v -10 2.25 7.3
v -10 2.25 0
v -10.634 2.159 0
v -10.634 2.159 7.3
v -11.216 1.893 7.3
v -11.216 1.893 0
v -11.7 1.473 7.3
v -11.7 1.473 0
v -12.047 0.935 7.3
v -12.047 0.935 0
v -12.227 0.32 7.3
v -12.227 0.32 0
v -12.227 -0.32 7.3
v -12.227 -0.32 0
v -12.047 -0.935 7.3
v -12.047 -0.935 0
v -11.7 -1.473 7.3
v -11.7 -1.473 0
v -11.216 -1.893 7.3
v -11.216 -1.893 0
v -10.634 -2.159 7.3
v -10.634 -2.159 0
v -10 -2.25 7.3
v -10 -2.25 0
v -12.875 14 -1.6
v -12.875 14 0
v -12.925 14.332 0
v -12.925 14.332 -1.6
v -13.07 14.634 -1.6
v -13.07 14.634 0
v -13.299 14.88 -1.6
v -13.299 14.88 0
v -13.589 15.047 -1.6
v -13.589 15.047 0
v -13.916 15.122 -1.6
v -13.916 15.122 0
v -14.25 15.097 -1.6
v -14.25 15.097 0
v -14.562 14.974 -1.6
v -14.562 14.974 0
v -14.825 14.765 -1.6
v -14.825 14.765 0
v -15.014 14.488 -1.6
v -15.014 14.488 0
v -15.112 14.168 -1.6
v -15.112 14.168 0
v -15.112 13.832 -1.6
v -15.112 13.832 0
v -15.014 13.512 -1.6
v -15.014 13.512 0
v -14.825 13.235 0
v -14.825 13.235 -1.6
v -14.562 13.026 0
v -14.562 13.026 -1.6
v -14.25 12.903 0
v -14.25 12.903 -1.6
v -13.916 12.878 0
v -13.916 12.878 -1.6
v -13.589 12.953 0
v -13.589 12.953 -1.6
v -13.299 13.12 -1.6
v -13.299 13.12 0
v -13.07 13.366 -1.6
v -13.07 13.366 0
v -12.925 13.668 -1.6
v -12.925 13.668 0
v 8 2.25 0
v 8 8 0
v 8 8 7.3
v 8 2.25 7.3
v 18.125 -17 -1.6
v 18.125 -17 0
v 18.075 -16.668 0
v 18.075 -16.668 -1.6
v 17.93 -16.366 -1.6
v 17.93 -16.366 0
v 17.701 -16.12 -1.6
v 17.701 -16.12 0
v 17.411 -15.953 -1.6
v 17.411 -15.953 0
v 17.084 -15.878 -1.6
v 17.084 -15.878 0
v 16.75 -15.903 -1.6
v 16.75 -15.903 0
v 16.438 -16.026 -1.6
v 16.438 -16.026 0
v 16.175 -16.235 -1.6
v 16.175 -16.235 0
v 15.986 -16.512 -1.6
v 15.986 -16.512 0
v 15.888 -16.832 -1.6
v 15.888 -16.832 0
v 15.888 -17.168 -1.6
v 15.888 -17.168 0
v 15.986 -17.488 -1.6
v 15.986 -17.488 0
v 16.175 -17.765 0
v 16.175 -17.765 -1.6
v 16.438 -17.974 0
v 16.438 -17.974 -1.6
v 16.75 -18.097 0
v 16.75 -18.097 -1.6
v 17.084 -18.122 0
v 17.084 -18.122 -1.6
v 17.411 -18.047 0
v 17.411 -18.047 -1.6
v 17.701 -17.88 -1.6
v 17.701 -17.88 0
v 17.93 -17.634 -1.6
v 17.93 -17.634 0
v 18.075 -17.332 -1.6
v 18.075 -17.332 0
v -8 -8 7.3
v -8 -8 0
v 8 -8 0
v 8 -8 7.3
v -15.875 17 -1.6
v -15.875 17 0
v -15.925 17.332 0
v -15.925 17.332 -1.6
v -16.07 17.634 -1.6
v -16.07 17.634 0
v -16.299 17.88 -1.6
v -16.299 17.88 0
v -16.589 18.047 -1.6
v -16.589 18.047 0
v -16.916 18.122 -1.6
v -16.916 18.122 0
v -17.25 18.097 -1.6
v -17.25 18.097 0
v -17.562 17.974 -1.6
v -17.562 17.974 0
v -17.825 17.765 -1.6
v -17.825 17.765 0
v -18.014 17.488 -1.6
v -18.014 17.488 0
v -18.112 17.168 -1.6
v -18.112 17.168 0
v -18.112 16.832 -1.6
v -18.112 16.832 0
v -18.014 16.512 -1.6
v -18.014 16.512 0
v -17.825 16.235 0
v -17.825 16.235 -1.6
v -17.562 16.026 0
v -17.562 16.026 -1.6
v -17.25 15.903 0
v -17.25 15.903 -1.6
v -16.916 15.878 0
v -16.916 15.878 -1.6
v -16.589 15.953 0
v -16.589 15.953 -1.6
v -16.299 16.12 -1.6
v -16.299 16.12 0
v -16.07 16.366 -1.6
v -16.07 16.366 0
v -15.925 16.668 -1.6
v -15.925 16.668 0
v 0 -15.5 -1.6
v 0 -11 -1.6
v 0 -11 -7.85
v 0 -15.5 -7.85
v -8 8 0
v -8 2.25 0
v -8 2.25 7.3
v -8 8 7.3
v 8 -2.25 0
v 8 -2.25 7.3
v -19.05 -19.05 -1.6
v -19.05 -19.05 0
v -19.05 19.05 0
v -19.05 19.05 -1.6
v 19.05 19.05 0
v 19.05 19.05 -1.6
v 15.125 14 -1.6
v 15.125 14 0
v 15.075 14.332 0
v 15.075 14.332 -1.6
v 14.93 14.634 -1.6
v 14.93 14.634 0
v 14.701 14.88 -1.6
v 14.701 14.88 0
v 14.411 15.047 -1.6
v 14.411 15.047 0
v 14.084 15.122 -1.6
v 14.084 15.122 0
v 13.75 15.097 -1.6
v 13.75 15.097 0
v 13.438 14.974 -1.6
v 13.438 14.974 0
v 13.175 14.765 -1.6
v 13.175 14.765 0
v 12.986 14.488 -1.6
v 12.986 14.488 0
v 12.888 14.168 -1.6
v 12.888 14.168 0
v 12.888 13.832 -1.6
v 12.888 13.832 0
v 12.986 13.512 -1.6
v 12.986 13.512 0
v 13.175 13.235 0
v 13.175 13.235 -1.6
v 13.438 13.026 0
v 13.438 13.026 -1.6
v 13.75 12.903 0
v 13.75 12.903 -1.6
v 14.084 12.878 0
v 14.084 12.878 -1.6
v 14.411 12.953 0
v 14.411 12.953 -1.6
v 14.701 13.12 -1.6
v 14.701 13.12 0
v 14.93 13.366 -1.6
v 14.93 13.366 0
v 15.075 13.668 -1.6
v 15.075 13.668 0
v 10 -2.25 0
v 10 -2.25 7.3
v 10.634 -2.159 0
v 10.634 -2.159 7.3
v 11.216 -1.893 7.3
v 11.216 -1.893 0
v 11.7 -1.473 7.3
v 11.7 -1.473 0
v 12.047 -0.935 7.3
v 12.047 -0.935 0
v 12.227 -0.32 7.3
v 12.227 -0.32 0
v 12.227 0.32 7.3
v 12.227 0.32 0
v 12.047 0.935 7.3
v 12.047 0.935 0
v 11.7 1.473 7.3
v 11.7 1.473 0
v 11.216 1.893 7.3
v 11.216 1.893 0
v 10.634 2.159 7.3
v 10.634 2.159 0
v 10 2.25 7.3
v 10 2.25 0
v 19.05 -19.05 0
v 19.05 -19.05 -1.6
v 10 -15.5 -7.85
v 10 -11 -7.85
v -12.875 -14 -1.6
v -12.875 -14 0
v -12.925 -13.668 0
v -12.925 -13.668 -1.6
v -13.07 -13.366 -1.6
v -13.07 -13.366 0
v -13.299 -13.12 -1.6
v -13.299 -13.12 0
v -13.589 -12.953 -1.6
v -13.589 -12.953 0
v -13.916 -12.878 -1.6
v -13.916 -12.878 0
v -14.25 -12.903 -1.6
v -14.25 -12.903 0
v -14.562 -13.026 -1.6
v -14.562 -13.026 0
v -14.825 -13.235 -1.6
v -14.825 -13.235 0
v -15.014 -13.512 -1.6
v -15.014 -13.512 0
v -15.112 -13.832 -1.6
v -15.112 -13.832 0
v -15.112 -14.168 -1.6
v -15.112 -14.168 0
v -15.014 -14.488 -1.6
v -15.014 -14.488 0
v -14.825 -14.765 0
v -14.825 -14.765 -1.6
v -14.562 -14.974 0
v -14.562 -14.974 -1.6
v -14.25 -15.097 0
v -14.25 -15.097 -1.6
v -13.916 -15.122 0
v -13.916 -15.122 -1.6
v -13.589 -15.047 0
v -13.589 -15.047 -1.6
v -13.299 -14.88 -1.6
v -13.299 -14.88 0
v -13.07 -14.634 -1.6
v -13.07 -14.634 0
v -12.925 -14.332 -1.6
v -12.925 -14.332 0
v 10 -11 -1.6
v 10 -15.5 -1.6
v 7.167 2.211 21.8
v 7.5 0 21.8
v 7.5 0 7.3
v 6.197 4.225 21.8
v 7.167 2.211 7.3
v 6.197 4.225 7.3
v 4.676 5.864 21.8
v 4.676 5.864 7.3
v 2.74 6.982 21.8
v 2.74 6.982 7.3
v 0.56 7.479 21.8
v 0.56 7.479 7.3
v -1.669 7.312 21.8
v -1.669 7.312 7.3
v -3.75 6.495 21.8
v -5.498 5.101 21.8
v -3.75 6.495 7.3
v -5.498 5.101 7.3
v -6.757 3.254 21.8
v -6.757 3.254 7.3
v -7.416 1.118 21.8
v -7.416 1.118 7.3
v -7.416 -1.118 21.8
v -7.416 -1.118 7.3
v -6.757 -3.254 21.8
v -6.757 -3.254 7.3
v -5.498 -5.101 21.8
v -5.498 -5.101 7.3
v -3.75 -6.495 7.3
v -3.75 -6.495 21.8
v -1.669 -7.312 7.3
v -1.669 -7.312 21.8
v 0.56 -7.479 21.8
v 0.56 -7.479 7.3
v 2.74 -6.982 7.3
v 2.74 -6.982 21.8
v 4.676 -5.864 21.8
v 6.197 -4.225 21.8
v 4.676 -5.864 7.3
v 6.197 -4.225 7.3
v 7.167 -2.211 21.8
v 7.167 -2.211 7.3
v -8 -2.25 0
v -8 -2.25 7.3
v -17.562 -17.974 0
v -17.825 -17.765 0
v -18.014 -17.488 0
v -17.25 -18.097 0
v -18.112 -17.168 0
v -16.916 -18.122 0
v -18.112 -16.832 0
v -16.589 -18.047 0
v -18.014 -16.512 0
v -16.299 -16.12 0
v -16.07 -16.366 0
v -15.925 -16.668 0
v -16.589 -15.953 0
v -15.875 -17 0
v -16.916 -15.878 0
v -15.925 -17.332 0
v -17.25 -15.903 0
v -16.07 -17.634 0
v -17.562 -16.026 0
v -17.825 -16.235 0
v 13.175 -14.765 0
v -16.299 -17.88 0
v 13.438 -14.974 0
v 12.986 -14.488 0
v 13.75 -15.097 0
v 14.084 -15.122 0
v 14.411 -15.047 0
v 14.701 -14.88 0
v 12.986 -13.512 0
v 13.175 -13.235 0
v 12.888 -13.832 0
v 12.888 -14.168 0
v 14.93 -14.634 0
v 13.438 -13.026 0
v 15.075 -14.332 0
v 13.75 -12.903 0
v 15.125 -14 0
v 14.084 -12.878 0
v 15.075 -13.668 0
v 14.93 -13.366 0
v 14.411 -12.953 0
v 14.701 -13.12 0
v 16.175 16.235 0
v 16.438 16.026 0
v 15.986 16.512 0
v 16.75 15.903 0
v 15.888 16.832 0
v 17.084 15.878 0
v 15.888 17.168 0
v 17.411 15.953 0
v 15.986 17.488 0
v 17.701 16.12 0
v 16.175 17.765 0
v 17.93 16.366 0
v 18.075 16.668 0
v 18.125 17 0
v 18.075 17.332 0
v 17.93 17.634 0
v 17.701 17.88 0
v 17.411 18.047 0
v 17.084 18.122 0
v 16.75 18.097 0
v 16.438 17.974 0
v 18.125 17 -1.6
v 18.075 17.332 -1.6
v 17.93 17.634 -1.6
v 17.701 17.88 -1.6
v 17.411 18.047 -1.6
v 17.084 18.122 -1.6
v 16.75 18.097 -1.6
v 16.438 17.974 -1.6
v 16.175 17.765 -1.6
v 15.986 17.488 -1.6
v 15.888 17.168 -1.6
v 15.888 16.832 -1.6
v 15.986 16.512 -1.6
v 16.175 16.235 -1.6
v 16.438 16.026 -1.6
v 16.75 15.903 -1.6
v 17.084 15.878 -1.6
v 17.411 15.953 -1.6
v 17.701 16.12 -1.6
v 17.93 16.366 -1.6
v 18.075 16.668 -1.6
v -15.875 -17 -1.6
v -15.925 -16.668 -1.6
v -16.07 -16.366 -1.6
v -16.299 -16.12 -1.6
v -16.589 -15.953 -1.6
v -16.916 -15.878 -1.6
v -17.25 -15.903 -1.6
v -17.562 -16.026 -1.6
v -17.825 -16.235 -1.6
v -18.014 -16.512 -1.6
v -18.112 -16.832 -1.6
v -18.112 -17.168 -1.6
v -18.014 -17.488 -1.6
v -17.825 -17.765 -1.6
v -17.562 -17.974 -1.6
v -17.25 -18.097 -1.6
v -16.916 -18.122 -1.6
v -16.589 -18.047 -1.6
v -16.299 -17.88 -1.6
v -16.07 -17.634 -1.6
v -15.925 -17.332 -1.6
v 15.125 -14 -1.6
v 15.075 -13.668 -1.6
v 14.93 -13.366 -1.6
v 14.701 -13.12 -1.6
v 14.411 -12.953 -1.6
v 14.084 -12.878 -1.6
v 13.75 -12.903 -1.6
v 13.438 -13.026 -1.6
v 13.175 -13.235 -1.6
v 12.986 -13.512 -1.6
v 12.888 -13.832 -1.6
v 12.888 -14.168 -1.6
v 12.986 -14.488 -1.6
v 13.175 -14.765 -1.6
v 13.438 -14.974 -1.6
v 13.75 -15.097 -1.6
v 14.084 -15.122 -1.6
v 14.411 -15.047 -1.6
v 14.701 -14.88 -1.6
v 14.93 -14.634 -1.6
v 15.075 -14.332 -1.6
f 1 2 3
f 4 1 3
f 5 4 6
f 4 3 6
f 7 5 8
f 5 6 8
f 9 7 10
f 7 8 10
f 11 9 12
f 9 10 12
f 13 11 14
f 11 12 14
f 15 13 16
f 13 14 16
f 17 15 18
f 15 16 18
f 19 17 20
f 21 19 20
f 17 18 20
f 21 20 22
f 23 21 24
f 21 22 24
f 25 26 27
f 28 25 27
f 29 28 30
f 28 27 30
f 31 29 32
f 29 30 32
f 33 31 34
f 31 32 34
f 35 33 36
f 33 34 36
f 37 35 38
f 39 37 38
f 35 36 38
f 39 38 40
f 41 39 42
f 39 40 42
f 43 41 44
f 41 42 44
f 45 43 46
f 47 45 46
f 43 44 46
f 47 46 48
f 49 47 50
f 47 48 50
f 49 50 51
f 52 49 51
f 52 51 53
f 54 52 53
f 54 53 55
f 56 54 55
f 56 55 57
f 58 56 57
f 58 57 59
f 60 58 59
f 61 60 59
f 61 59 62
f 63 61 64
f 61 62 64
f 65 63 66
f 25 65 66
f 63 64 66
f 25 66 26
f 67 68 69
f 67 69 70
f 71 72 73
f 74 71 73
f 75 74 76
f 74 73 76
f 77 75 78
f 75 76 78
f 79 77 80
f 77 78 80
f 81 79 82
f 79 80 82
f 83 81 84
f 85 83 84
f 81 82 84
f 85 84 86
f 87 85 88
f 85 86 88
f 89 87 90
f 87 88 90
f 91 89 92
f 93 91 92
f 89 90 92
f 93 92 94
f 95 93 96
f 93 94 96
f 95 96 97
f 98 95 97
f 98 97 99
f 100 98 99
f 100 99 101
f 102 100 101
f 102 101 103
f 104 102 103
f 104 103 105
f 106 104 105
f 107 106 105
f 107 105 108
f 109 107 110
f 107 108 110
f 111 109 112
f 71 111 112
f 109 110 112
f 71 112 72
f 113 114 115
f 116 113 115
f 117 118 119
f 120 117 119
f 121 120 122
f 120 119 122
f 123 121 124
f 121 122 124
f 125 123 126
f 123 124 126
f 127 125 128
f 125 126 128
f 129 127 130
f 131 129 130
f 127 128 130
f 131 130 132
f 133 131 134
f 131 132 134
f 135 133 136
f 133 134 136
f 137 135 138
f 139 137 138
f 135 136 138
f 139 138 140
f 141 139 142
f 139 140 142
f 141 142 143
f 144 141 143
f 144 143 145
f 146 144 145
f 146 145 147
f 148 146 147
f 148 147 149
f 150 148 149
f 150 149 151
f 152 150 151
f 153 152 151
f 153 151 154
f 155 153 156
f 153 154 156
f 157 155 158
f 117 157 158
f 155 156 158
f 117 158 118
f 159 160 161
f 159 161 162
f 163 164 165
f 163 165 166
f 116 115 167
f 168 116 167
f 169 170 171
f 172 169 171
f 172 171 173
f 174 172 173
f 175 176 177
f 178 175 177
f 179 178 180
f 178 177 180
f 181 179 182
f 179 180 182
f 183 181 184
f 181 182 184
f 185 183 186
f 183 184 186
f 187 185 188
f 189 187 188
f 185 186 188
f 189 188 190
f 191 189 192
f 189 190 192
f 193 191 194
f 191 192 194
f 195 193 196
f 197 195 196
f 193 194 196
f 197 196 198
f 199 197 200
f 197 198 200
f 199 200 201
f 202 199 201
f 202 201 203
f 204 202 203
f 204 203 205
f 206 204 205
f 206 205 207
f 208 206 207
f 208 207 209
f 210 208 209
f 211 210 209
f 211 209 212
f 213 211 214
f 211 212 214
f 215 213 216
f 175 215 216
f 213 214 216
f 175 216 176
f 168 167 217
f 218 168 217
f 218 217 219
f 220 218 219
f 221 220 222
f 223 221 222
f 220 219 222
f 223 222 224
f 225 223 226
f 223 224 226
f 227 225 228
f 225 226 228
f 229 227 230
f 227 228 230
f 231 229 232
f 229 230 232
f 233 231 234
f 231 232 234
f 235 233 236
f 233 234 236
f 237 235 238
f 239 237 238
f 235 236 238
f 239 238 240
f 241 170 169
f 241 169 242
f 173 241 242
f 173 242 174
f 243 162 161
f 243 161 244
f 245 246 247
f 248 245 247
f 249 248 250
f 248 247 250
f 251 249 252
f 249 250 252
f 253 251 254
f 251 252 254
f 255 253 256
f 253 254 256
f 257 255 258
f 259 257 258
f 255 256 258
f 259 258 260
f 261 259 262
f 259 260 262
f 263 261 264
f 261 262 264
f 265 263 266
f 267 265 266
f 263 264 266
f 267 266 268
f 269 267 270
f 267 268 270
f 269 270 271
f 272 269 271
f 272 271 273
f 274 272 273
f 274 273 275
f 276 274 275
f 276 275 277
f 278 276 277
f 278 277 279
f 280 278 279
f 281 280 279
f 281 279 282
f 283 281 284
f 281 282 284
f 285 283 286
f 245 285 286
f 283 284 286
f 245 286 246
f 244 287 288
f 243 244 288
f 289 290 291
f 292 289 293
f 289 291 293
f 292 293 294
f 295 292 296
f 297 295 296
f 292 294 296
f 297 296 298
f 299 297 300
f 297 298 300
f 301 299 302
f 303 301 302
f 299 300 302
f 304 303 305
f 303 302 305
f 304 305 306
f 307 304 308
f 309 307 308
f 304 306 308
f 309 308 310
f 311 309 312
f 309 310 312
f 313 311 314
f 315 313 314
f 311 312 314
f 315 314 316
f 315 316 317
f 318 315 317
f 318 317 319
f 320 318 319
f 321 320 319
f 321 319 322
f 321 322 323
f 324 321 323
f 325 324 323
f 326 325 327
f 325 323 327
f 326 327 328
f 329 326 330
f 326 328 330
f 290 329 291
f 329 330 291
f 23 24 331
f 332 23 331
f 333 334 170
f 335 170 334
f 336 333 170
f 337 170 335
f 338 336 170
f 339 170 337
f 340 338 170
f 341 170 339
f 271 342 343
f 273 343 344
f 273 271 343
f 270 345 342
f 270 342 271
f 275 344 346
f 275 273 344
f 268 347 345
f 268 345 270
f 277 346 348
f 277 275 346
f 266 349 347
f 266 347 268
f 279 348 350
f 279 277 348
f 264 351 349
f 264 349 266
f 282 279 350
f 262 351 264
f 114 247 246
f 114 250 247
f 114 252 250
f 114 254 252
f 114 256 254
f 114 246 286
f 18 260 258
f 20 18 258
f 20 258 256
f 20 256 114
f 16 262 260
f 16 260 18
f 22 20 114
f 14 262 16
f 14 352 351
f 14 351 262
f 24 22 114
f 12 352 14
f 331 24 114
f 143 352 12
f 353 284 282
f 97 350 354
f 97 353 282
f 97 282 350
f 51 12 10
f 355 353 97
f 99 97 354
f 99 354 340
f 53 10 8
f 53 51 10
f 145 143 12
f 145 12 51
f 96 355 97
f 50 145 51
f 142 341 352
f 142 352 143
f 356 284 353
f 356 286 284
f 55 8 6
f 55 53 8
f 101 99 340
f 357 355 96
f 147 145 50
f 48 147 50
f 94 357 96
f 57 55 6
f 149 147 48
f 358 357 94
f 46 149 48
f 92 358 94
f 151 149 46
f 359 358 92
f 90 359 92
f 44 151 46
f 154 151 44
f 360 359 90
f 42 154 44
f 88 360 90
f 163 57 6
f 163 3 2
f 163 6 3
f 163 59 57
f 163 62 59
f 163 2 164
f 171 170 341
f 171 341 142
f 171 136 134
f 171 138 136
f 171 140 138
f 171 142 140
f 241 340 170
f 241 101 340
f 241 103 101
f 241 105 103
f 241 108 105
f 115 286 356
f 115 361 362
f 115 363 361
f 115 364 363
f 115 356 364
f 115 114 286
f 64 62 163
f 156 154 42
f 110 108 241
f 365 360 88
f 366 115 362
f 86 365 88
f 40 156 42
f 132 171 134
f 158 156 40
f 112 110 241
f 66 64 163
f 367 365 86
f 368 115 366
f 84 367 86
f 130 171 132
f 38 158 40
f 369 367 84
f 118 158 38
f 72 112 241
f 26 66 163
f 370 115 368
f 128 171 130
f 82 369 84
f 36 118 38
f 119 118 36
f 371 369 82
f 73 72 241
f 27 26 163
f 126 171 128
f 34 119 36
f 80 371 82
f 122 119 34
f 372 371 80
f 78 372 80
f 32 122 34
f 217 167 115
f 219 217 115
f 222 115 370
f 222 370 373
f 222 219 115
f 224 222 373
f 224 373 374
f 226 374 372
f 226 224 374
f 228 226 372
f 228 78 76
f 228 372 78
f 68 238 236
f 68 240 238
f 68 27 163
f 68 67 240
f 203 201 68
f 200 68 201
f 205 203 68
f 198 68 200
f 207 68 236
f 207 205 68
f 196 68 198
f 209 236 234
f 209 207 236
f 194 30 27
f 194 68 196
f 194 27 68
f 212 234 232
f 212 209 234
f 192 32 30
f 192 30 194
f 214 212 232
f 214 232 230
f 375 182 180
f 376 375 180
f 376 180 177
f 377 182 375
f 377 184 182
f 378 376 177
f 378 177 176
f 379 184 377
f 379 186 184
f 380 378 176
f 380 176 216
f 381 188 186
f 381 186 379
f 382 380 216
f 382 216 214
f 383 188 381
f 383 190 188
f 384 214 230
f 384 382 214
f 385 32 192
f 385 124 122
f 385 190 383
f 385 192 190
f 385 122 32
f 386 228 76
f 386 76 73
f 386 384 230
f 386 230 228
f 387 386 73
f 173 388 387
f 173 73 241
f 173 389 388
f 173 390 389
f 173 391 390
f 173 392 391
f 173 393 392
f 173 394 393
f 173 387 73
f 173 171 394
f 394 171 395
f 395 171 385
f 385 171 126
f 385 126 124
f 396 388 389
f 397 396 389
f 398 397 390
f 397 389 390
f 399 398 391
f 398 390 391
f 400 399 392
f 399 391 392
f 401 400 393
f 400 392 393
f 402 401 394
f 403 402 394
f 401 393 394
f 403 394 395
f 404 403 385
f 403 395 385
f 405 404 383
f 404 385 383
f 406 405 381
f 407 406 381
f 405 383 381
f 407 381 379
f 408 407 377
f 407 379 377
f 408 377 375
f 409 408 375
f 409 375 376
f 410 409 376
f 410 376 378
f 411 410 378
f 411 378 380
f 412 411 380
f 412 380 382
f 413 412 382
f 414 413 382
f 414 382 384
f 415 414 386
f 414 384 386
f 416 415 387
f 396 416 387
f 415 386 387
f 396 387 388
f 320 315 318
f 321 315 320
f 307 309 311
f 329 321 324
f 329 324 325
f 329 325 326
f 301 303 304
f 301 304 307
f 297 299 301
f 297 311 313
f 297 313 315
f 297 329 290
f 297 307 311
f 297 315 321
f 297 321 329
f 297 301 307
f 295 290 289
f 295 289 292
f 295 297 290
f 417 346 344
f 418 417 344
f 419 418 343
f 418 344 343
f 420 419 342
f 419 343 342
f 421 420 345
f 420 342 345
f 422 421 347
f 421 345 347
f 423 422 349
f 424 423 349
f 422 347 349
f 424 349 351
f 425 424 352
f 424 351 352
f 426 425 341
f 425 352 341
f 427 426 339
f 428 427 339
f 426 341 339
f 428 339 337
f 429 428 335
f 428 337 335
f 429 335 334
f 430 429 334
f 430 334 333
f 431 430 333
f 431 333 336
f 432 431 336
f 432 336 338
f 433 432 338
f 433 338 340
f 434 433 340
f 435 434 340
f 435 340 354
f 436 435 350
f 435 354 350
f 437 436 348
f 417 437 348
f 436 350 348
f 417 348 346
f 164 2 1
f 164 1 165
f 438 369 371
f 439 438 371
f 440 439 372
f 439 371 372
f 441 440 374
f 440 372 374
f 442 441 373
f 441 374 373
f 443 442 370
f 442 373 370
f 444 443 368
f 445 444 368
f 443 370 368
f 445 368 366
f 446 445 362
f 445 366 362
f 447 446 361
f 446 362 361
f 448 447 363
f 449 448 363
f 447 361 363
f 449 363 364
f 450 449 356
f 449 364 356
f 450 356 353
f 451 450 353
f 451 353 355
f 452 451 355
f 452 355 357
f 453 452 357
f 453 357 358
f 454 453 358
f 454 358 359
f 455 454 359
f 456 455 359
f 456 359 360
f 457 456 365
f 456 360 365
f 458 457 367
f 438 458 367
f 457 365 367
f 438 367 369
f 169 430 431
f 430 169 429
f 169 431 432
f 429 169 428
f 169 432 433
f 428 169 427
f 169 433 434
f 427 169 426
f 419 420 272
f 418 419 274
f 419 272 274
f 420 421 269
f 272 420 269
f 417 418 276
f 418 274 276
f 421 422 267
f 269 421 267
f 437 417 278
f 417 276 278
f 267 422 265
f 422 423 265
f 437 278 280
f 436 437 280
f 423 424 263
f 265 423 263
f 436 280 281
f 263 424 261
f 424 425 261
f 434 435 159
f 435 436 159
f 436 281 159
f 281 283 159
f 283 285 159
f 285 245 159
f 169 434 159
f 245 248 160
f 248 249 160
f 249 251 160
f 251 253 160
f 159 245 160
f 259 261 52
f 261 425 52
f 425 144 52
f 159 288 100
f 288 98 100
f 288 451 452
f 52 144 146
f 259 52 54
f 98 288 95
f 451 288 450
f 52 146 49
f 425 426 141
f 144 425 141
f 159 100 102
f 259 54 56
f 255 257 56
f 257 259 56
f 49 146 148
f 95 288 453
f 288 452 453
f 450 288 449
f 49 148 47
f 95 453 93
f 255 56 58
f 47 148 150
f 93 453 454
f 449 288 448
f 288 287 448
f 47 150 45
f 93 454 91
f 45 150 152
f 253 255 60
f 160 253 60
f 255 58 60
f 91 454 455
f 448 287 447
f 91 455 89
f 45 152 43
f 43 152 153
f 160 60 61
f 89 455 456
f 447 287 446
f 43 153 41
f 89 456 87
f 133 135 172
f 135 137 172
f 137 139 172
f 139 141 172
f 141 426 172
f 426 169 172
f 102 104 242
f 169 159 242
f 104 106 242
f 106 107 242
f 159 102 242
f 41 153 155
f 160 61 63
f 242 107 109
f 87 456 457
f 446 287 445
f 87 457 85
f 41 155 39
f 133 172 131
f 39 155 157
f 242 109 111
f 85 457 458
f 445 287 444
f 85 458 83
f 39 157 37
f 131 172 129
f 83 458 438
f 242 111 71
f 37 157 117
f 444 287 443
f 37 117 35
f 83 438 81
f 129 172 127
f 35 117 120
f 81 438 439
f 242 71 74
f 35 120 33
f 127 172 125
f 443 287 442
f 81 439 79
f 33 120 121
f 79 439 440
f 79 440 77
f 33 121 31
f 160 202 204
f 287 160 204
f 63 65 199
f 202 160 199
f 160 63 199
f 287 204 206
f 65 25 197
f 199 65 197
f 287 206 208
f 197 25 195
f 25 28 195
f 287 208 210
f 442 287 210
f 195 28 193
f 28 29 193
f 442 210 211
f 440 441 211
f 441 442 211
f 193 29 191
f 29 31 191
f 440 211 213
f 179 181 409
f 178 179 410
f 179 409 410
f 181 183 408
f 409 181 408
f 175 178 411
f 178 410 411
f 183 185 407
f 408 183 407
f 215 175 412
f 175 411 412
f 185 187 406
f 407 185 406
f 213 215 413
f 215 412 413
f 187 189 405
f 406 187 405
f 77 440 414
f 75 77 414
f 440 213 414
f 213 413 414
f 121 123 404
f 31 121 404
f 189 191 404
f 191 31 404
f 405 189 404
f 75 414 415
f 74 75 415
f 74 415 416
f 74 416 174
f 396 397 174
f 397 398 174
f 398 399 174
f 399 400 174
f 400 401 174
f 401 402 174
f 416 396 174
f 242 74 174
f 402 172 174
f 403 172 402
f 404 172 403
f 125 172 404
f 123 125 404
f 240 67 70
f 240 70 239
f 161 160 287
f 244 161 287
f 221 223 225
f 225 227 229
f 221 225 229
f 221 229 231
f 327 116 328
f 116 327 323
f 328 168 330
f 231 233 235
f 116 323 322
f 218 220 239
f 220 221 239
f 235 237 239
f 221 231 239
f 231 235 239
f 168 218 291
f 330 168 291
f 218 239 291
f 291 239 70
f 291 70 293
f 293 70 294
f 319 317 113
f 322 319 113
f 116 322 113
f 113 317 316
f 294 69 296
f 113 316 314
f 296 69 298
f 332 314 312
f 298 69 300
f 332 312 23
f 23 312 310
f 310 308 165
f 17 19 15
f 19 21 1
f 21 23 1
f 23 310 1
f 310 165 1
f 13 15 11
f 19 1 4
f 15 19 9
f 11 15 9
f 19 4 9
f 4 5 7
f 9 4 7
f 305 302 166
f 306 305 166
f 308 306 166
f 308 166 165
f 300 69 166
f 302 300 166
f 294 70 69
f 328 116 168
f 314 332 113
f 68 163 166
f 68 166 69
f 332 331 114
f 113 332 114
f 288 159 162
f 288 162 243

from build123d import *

# Parameters (mm, degrees)
SKETCH_W     = 38.1
SKETCH_H     = 38.1
SKETCH_R     = 1.125
PAD_DEPTH    = 1.6
PAD001_DEPTH = 7.3
SKETCH002_R  = 7.5
PAD002_DEPTH = 14.5
SKETCH003_W  = 10
SKETCH003_H  = 4.5
PAD003_DEPTH = 6.25


with BuildPart() as part:
    # Sketch → Pad (new body)
    with BuildSketch(Plane.XY):
        Rectangle(SKETCH_W, SKETCH_H)
        with Locations((-14, 14)):
            Circle(SKETCH_R, mode=Mode.SUBTRACT)
        with Locations((14, 14)):
            Circle(SKETCH_R, mode=Mode.SUBTRACT)
        with Locations((14, -14)):
            Circle(SKETCH_R, mode=Mode.SUBTRACT)
        with Locations((-14, -14)):
            Circle(SKETCH_R, mode=Mode.SUBTRACT)
        with Locations((-17, 17)):
            Circle(SKETCH_R, mode=Mode.SUBTRACT)
        with Locations((17, 17)):
            Circle(SKETCH_R, mode=Mode.SUBTRACT)
        with Locations((17, -17)):
            Circle(SKETCH_R, mode=Mode.SUBTRACT)
        with Locations((-17, -17)):
            Circle(SKETCH_R, mode=Mode.SUBTRACT)
    extrude(amount=-PAD_DEPTH)

    # Sketch001 → Pad001 (join)
    with BuildSketch(Plane.XY):
        with BuildLine():
            Line((-8, 2.25), (-8, 8))
            Line((-8, 8), (8, 8))
            Line((8, 8), (8, 2.25))
            Line((8, 2.25), (10.000011, 2.25))
            ThreePointArc((10.000011, -2.25), (12.25, 0), (10.000011, 2.25))
            Line((8, -2.25), (10.000011, -2.25))
            Line((8, -8), (8, -2.25))
            Line((-8, -8), (8, -8))
            Line((-8, -2.25), (-8, -8))
            Line((-9.999989, -2.25), (-8, -2.25))
            ThreePointArc((-10, 2.25), (-12.25, -6e-06), (-9.999989, -2.25))
            Line((-10, 2.25), (-8, 2.25))
        make_face()
    extrude(amount=PAD001_DEPTH)

    # Sketch002 (on DatumPlane) → Pad002 (join)
    with BuildSketch(Plane.XY.offset(7.3)):
        Circle(SKETCH002_R)
    extrude(amount=PAD002_DEPTH)

    # Sketch003 (on DatumPlane) → Pad003 (join)
    with BuildSketch(Plane(origin=(0, 0, -1.6), x_dir=(1, 0, 0), z_dir=(0, 0, -1))):
        with Locations((5, 13.25)):
            Rectangle(SKETCH003_W, SKETCH003_H)
    extrude(amount=PAD003_DEPTH)


solid = part.part
